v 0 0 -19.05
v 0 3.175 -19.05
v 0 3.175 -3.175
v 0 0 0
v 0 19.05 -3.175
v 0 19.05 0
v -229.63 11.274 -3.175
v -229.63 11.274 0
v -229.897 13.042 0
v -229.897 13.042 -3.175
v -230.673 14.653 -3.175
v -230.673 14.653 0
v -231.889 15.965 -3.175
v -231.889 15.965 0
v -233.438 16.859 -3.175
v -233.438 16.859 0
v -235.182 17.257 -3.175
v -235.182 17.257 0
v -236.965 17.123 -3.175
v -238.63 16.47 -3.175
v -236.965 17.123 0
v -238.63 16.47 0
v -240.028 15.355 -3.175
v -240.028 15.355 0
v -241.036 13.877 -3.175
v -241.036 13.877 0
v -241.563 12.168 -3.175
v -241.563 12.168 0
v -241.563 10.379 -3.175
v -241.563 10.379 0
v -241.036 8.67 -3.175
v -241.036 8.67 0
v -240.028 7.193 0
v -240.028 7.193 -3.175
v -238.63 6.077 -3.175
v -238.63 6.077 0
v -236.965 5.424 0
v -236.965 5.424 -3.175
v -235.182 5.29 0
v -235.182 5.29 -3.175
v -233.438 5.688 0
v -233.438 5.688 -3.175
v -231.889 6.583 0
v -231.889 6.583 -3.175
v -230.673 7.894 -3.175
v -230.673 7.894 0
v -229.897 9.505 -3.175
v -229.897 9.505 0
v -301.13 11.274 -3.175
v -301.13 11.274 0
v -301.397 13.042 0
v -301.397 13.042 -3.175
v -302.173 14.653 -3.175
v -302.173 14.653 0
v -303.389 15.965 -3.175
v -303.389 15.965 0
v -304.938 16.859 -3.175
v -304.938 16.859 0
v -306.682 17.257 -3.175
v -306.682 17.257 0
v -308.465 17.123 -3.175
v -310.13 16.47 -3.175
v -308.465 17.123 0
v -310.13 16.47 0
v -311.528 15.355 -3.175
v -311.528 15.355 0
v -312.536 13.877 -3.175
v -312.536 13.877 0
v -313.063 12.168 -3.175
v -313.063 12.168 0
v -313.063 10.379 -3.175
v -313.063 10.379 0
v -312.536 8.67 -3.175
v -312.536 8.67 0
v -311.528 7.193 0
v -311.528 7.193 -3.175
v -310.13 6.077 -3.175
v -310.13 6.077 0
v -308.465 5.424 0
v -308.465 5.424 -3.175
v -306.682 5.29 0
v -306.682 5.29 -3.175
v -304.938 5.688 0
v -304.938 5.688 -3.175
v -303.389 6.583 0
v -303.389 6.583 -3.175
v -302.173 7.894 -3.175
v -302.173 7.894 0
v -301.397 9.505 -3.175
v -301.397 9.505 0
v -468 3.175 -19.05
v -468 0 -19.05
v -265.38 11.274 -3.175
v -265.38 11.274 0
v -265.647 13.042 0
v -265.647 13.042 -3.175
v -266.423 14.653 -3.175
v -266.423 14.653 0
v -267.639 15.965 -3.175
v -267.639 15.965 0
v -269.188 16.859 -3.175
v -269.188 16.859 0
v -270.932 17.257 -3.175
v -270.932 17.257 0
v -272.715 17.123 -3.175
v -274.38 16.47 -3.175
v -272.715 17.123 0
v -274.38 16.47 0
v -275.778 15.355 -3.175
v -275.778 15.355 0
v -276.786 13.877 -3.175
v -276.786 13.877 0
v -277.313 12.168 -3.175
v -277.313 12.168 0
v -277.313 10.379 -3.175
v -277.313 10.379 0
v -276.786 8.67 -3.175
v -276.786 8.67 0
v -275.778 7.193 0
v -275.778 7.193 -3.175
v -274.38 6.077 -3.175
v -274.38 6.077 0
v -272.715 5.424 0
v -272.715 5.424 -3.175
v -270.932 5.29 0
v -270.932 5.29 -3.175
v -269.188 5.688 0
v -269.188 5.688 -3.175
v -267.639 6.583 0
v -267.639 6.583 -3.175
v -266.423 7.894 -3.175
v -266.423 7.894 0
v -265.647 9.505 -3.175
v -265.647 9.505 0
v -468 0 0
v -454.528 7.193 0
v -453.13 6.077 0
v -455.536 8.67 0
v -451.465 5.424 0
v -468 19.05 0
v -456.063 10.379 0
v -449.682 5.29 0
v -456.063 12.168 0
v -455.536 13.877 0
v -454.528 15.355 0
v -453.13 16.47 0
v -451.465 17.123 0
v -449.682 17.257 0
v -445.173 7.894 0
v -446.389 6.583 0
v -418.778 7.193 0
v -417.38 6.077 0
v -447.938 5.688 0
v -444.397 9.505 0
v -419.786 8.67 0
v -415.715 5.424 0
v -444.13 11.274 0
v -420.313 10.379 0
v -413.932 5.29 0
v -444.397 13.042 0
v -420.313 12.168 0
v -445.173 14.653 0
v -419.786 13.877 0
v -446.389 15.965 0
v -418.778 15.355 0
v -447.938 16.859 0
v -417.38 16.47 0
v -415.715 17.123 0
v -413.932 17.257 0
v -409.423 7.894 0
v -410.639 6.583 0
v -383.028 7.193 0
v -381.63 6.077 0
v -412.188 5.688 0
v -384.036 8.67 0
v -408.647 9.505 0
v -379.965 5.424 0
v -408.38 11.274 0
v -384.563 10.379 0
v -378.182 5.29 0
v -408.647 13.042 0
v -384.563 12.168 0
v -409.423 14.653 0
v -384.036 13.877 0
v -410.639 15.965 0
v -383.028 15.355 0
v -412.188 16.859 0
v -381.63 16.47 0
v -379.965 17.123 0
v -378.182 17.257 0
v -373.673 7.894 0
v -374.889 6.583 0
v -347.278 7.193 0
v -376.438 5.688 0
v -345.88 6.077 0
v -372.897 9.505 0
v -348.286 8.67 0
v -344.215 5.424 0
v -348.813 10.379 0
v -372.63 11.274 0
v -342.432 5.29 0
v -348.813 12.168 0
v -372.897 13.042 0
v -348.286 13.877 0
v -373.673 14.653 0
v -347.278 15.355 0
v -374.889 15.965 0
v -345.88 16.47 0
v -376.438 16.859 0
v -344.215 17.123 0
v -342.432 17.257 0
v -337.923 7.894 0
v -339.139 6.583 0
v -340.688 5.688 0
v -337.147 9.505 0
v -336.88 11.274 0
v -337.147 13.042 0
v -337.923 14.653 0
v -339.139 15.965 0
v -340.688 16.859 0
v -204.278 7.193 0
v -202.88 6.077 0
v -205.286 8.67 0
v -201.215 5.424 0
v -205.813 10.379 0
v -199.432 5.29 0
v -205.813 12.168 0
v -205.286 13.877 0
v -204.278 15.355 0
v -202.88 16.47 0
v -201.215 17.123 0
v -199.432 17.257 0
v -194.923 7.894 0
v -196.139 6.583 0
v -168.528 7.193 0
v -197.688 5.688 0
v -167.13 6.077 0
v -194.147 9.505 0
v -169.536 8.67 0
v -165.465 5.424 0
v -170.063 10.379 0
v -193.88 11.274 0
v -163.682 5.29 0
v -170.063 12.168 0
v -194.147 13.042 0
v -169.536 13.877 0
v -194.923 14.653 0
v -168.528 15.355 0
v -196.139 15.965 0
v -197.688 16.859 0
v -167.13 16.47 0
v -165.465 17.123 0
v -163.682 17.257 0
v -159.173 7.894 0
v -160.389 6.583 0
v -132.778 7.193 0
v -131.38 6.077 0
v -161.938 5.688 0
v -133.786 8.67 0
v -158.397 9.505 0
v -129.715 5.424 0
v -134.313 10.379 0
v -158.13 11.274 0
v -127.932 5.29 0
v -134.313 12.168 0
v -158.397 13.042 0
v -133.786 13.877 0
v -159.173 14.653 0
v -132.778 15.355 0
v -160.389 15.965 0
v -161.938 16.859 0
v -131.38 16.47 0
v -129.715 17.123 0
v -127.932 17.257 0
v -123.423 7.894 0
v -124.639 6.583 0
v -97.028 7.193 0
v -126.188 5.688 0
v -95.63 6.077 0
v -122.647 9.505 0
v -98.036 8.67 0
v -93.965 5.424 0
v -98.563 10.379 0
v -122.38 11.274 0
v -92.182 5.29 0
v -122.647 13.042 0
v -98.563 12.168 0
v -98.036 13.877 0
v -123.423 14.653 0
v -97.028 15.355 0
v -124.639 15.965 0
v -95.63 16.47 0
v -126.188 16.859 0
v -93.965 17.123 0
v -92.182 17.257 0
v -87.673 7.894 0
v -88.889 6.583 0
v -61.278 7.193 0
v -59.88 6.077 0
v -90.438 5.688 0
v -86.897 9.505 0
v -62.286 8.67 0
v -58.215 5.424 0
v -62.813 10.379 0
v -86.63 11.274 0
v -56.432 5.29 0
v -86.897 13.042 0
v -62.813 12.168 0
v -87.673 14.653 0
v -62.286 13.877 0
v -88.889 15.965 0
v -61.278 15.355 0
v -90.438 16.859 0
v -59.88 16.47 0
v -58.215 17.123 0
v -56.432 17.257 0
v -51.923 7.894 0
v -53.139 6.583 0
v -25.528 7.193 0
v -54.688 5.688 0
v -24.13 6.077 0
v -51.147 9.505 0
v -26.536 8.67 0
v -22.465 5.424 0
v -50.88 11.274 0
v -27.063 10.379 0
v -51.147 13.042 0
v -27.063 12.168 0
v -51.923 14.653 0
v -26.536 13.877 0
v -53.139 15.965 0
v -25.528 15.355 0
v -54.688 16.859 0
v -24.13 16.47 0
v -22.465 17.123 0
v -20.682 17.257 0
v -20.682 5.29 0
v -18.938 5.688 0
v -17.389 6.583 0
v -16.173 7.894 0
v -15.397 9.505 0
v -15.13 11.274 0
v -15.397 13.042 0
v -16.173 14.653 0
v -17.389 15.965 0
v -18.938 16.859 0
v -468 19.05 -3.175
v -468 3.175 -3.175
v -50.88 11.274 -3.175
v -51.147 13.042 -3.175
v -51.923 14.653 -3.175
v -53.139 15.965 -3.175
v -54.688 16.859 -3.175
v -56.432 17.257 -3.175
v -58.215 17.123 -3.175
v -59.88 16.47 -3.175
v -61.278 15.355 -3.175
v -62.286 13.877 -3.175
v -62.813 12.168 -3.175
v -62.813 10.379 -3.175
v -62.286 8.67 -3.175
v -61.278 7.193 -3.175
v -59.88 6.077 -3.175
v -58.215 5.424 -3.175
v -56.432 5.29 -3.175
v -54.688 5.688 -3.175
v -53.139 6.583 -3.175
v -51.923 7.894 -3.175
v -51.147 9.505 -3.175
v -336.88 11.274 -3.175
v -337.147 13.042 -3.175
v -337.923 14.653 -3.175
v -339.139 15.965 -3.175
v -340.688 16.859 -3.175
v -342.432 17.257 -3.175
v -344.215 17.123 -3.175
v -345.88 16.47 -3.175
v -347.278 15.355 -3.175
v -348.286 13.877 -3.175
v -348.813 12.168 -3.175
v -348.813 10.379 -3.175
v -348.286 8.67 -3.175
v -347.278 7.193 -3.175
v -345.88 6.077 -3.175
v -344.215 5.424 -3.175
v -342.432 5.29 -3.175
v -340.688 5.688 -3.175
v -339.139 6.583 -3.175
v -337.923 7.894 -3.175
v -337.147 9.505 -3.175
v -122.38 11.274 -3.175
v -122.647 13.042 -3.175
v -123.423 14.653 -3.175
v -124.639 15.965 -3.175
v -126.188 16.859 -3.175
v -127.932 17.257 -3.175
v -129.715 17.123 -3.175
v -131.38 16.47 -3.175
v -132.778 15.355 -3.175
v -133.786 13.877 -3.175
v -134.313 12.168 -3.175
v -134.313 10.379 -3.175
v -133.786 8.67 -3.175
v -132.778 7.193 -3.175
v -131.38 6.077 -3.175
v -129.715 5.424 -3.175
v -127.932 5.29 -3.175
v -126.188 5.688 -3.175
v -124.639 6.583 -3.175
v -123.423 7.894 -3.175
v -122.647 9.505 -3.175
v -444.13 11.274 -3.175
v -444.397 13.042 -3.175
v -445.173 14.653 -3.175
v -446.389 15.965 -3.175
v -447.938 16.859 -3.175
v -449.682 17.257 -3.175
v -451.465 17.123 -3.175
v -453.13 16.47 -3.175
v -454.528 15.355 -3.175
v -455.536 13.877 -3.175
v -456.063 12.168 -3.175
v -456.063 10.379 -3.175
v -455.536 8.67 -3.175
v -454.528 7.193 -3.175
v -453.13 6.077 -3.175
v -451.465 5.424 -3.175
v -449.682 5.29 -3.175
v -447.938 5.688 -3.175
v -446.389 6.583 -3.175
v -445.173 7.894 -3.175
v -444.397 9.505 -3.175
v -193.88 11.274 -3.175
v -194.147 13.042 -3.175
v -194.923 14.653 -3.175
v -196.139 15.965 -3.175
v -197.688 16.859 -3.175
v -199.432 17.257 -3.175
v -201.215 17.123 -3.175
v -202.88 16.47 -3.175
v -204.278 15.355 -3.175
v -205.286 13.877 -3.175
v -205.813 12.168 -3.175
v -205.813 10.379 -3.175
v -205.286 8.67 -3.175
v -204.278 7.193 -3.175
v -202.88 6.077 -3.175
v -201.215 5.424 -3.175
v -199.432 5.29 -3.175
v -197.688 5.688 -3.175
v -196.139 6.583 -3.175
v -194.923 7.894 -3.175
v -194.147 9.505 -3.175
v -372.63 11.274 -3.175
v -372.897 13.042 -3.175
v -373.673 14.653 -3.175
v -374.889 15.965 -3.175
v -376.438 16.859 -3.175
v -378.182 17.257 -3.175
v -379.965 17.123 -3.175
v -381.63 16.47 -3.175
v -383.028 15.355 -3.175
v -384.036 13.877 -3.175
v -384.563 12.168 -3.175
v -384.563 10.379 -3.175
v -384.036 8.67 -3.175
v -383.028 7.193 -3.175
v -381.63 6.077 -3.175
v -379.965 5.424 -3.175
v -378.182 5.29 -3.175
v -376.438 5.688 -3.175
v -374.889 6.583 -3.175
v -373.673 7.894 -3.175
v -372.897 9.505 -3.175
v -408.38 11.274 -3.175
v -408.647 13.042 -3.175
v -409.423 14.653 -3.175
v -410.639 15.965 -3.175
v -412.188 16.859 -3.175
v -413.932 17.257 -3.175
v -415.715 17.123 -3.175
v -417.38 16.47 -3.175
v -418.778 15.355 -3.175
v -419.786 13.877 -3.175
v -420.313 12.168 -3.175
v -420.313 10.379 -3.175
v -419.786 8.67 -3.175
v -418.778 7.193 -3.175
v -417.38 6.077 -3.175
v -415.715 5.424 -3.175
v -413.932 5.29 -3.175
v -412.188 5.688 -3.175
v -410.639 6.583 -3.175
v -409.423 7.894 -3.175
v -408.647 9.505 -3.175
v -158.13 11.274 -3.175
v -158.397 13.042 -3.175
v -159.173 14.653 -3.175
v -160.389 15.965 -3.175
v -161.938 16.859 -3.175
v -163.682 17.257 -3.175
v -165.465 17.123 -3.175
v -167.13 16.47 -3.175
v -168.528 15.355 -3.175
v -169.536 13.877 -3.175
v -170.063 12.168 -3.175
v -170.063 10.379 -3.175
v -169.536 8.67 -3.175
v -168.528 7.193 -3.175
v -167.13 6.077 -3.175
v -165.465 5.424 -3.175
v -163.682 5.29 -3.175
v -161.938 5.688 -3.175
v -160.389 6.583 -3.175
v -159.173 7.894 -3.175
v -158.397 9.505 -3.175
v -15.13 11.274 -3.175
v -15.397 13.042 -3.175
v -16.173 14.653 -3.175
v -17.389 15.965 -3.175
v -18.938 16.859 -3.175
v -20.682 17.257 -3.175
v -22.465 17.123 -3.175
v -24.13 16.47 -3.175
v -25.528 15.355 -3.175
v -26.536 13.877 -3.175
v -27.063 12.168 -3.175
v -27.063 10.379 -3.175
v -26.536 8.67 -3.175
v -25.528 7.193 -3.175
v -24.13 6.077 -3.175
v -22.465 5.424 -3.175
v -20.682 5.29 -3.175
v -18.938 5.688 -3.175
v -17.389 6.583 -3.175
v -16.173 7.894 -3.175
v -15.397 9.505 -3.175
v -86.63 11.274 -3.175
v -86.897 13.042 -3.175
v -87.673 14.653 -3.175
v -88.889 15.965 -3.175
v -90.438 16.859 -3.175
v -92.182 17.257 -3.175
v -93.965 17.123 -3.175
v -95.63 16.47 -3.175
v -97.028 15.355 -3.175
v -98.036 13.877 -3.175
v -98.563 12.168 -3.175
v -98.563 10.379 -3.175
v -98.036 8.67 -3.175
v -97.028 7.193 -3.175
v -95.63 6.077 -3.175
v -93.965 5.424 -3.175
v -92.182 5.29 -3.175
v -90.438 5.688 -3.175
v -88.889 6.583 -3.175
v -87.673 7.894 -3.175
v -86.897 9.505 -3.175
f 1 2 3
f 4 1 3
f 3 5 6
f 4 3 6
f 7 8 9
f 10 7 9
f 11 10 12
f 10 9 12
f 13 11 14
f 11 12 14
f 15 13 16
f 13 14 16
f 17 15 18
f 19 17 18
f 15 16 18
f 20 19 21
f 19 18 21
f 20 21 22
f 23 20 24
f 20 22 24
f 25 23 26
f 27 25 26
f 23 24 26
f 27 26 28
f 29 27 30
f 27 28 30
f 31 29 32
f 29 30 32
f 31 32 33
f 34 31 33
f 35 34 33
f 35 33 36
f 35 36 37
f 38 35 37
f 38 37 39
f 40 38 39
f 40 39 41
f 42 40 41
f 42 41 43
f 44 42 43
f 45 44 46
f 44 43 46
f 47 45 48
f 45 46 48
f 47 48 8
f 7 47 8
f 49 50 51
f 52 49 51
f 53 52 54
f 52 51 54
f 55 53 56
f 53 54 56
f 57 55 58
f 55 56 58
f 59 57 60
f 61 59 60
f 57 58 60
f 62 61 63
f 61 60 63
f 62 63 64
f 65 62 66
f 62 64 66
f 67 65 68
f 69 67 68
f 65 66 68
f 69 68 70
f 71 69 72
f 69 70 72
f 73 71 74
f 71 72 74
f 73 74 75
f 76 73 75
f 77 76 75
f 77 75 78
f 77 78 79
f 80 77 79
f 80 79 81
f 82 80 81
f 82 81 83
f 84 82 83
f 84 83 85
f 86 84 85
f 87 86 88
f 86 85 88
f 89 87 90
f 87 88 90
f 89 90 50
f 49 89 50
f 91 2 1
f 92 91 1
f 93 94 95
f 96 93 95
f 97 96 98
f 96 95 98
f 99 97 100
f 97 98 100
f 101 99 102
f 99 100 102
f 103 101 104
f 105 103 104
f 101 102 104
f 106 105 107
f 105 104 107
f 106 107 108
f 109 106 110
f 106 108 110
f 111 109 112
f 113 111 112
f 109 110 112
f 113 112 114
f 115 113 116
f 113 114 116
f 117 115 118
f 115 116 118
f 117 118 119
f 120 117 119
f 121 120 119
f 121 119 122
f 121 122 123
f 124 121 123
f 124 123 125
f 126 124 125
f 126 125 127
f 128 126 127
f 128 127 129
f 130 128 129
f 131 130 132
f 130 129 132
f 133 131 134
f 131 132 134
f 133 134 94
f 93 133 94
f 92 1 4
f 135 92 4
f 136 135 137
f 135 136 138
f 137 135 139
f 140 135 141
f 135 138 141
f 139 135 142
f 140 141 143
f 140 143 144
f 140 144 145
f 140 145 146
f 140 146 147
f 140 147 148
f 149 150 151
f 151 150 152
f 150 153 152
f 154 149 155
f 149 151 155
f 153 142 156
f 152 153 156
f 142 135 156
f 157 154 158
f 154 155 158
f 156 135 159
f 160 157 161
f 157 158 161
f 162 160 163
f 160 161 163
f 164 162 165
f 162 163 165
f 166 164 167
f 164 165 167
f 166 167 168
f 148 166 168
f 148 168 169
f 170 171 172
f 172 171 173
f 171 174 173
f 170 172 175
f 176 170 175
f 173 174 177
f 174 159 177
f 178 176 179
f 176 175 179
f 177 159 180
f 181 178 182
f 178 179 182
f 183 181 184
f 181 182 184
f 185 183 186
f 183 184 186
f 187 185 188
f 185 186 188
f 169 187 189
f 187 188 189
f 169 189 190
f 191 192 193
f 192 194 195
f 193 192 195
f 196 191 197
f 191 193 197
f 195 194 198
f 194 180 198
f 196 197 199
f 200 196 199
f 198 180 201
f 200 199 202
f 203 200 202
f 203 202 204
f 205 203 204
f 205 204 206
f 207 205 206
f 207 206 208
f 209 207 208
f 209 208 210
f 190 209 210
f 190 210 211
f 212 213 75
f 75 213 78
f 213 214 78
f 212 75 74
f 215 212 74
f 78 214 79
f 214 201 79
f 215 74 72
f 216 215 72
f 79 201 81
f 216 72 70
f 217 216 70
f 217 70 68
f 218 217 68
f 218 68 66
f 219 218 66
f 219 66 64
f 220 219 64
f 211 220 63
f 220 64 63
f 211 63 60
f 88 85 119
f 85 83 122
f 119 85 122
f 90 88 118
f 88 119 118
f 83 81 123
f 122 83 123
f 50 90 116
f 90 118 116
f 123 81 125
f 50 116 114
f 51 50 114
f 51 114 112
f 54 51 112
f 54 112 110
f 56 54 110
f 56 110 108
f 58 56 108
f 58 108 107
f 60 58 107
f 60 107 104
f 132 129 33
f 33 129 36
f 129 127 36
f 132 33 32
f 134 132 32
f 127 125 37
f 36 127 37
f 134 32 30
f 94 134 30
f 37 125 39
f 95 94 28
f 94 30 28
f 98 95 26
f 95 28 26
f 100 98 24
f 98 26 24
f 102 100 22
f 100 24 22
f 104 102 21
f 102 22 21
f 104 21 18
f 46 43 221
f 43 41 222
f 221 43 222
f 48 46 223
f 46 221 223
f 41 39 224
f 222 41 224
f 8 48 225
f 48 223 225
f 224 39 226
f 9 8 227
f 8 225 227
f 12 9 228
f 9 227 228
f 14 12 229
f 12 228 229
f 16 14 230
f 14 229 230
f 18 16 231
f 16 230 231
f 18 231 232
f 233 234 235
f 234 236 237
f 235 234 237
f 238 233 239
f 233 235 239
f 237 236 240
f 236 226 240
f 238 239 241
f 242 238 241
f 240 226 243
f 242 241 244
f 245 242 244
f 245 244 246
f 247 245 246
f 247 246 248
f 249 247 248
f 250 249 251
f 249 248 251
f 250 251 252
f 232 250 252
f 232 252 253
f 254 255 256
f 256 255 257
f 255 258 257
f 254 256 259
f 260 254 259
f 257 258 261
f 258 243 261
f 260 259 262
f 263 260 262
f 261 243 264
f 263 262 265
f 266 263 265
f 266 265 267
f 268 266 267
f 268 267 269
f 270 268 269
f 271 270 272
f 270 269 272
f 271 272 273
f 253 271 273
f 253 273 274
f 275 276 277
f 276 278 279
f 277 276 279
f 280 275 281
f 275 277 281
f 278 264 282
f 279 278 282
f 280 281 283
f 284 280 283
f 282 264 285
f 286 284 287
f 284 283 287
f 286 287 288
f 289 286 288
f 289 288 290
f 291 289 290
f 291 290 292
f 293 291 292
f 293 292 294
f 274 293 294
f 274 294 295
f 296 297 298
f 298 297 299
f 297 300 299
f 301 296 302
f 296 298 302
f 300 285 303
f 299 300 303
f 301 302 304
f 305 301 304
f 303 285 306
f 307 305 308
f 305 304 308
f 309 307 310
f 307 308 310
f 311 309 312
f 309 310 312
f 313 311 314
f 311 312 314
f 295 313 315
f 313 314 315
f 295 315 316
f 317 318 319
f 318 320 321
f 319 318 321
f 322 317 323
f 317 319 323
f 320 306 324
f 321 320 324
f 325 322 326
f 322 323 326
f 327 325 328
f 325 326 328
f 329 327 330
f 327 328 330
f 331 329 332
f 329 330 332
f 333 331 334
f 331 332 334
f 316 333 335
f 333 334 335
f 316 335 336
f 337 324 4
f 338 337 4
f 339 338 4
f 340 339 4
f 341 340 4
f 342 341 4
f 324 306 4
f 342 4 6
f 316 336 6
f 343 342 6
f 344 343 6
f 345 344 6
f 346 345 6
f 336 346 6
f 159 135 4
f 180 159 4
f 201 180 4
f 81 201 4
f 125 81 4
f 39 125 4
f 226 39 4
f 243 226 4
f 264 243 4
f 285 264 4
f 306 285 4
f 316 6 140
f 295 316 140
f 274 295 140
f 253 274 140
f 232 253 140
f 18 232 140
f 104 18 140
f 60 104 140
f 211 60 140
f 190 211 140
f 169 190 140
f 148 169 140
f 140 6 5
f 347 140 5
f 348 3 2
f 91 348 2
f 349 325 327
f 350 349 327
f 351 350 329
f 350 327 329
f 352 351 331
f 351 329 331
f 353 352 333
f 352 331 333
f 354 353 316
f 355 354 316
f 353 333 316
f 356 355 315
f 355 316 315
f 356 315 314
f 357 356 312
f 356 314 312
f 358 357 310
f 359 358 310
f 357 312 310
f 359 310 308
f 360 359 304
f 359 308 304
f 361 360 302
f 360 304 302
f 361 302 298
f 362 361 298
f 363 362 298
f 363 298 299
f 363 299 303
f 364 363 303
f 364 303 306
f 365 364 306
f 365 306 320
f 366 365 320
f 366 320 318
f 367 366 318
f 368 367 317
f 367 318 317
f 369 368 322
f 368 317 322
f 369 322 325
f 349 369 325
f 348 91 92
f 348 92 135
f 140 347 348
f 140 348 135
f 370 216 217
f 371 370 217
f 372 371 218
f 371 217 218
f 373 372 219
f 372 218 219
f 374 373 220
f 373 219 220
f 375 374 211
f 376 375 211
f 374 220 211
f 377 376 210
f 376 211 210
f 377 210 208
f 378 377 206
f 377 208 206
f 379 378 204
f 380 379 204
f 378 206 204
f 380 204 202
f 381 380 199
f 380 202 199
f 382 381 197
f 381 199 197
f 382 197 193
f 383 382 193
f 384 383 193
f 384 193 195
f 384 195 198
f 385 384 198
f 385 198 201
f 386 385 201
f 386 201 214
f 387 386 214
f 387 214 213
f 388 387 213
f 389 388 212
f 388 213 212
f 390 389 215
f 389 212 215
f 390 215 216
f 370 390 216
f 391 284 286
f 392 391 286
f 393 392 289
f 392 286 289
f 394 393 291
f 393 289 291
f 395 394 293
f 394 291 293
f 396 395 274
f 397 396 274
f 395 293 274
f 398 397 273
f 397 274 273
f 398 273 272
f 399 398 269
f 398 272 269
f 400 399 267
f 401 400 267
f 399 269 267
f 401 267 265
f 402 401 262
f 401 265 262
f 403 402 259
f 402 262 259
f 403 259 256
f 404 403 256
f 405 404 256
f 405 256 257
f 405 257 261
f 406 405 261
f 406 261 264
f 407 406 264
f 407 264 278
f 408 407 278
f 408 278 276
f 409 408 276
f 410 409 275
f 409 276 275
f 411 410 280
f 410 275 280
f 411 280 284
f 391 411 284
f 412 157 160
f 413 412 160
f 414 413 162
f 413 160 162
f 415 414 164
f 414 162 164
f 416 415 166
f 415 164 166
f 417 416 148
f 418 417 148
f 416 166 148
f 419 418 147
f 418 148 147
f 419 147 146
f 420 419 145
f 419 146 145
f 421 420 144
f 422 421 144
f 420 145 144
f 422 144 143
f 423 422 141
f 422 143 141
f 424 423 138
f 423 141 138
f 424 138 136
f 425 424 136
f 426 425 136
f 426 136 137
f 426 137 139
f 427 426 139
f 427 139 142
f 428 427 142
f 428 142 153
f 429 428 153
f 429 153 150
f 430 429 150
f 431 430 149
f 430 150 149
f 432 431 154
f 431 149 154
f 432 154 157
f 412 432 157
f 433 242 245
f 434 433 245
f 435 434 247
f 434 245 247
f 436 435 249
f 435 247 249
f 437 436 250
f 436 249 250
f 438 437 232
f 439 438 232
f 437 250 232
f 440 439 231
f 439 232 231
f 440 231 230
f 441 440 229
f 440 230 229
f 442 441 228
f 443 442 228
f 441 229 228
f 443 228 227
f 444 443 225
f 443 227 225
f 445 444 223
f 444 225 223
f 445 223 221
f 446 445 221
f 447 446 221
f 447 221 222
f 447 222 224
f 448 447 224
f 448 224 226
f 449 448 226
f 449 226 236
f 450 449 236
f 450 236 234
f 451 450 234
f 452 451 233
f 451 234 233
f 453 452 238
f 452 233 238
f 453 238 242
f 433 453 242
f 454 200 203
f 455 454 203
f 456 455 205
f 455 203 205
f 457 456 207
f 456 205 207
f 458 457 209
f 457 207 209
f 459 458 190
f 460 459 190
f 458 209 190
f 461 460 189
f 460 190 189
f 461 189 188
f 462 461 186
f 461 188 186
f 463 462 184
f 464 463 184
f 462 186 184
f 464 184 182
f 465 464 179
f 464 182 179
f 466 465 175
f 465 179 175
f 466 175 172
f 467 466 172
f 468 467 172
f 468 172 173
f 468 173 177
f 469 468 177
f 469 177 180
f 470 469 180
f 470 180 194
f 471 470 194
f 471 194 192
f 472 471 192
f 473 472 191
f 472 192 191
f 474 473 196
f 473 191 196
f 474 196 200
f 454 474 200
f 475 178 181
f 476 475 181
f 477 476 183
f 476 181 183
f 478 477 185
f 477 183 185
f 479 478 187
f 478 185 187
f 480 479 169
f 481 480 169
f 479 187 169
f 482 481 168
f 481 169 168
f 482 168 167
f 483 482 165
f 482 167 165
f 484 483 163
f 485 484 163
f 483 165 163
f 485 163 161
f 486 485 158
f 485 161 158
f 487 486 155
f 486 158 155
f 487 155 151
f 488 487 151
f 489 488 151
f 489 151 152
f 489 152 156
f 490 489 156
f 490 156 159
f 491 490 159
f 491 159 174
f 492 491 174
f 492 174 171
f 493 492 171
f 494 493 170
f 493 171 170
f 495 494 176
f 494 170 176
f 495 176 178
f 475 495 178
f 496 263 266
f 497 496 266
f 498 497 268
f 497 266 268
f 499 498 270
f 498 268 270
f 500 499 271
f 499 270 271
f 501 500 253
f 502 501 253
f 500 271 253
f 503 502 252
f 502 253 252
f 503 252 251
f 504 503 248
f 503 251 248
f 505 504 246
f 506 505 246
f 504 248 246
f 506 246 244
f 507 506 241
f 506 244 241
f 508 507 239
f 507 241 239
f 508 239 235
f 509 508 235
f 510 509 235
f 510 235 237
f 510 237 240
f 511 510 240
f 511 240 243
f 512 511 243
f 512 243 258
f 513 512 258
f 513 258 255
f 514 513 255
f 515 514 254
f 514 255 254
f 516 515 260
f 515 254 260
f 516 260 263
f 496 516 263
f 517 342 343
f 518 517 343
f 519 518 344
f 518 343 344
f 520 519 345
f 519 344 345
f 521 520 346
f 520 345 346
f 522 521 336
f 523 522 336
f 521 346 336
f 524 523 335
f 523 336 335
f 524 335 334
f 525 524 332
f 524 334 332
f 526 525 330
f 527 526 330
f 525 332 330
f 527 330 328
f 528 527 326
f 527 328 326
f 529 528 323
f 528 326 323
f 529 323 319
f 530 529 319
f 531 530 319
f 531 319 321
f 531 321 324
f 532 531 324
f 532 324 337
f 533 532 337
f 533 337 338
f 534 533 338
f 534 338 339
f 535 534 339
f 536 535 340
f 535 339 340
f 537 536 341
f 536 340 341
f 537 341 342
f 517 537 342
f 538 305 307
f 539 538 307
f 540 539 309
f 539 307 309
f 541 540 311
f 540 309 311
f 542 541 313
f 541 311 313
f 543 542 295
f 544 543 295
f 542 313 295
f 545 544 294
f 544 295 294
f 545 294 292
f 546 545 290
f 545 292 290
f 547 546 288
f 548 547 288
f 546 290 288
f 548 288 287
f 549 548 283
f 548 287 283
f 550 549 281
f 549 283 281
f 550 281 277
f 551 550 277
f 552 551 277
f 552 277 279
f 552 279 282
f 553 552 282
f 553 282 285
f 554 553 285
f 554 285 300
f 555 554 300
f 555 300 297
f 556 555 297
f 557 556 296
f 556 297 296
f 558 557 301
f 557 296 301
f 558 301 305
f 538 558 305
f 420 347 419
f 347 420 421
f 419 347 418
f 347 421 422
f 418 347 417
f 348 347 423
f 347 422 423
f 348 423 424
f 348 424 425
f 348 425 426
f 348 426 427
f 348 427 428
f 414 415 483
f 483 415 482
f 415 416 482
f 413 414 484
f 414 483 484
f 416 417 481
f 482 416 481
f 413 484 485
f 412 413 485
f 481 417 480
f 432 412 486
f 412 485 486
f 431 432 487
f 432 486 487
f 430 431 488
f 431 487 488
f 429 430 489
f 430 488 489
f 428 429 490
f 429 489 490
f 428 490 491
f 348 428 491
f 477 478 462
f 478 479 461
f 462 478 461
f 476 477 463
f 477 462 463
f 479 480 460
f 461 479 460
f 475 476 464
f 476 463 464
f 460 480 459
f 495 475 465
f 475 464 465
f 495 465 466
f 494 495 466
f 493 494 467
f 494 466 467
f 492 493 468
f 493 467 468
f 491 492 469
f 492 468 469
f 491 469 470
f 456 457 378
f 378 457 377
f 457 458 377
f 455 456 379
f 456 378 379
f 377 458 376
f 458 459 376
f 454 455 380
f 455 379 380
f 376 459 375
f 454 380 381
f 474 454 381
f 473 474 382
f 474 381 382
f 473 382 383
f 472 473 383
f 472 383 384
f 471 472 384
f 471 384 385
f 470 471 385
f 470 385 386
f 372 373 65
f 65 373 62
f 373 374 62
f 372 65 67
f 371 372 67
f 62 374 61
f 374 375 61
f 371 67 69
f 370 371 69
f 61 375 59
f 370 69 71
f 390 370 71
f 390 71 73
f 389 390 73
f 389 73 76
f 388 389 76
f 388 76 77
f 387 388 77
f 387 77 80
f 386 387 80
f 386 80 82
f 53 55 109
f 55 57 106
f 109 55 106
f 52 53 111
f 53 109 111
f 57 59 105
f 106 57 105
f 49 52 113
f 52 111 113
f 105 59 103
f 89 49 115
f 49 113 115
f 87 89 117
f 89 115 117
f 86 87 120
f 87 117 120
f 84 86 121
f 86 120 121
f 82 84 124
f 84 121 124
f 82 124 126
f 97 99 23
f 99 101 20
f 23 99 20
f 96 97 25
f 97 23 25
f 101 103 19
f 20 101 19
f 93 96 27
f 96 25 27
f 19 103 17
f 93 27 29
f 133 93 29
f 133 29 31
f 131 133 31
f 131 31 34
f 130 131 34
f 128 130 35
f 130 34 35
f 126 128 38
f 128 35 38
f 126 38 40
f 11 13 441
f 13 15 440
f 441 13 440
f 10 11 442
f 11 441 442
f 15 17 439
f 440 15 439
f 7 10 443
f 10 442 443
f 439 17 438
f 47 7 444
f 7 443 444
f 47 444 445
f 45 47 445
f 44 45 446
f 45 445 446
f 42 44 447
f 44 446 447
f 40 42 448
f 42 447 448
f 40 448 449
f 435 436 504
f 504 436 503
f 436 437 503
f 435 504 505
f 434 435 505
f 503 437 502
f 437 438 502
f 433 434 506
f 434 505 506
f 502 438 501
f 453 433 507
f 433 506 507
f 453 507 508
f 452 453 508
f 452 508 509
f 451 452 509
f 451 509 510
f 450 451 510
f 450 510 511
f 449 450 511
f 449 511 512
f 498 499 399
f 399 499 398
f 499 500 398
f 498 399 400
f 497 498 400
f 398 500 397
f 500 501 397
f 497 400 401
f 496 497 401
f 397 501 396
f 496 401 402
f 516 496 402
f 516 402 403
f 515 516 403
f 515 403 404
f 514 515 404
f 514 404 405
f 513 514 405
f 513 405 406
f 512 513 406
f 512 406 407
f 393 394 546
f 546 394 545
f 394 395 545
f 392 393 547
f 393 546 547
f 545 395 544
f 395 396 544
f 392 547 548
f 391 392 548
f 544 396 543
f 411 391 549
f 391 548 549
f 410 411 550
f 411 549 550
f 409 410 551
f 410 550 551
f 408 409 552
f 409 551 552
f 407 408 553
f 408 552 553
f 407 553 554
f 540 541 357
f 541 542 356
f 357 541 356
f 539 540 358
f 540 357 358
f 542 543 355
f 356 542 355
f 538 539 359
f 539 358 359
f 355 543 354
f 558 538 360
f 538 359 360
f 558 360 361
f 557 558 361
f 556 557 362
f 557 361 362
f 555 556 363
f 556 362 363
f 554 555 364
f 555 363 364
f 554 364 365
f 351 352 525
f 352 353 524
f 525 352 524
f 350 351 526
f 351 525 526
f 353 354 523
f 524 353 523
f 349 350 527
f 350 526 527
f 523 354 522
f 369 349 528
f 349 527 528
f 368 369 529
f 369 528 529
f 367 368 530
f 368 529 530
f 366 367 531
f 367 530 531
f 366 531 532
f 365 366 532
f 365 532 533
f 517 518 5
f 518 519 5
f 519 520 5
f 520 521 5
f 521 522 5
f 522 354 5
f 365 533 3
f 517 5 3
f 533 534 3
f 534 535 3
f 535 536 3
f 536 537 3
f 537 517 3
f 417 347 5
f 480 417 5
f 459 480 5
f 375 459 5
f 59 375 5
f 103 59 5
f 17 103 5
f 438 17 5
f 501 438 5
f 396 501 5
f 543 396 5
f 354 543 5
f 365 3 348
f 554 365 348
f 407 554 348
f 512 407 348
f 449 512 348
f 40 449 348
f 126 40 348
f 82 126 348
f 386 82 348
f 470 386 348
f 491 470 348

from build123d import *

# Parameters (mm, degrees)
BOSS_EXTRUDE1_DEPTH = 468
SKETCH2_R           = 6
CUT_EXTRUDE1_DEPTH  = 3.175


with BuildPart() as part:
    # Sketch1 → Boss-Extrude1 (new body)
    with BuildSketch(Plane(origin=(0, 0, 0), x_dir=(0, 0, -1), z_dir=(1, 0, 0))):
        Polygon((0, 0), (0, 19.05), (3.175, 19.05), (3.175, 3.175), (19.05, 3.175), (19.05, 0), align=None)
    extrude(amount=-BOSS_EXTRUDE1_DEPTH)

    # Sketch2 → Cut-Extrude1 (cut)
    with BuildSketch(Plane.XY):
        with Locations((-450.13, 11.273546723)):
            Circle(SKETCH2_R)
        with Locations((-414.38, 11.273546723)):
            Circle(SKETCH2_R)
        with Locations((-378.63, 11.273546723)):
            Circle(SKETCH2_R)
        with Locations((-342.88, 11.273546723)):
            Circle(SKETCH2_R)
        with Locations((-307.13, 11.273546723)):
            Circle(SKETCH2_R)
        with Locations((-271.38, 11.273546723)):
            Circle(SKETCH2_R)
        with Locations((-235.63, 11.273546723)):
            Circle(SKETCH2_R)
        with Locations((-199.88, 11.273546723)):
            Circle(SKETCH2_R)
        with Locations((-164.13, 11.273546723)):
            Circle(SKETCH2_R)
        with Locations((-128.38, 11.273546723)):
            Circle(SKETCH2_R)
        with Locations((-92.63, 11.273546723)):
            Circle(SKETCH2_R)
        with Locations((-56.88, 11.273546723)):
            Circle(SKETCH2_R)
        with Locations((-21.13, 11.273546723)):
            Circle(SKETCH2_R)
    extrude(amount=-CUT_EXTRUDE1_DEPTH, mode=Mode.SUBTRACT)


solid = part.part
